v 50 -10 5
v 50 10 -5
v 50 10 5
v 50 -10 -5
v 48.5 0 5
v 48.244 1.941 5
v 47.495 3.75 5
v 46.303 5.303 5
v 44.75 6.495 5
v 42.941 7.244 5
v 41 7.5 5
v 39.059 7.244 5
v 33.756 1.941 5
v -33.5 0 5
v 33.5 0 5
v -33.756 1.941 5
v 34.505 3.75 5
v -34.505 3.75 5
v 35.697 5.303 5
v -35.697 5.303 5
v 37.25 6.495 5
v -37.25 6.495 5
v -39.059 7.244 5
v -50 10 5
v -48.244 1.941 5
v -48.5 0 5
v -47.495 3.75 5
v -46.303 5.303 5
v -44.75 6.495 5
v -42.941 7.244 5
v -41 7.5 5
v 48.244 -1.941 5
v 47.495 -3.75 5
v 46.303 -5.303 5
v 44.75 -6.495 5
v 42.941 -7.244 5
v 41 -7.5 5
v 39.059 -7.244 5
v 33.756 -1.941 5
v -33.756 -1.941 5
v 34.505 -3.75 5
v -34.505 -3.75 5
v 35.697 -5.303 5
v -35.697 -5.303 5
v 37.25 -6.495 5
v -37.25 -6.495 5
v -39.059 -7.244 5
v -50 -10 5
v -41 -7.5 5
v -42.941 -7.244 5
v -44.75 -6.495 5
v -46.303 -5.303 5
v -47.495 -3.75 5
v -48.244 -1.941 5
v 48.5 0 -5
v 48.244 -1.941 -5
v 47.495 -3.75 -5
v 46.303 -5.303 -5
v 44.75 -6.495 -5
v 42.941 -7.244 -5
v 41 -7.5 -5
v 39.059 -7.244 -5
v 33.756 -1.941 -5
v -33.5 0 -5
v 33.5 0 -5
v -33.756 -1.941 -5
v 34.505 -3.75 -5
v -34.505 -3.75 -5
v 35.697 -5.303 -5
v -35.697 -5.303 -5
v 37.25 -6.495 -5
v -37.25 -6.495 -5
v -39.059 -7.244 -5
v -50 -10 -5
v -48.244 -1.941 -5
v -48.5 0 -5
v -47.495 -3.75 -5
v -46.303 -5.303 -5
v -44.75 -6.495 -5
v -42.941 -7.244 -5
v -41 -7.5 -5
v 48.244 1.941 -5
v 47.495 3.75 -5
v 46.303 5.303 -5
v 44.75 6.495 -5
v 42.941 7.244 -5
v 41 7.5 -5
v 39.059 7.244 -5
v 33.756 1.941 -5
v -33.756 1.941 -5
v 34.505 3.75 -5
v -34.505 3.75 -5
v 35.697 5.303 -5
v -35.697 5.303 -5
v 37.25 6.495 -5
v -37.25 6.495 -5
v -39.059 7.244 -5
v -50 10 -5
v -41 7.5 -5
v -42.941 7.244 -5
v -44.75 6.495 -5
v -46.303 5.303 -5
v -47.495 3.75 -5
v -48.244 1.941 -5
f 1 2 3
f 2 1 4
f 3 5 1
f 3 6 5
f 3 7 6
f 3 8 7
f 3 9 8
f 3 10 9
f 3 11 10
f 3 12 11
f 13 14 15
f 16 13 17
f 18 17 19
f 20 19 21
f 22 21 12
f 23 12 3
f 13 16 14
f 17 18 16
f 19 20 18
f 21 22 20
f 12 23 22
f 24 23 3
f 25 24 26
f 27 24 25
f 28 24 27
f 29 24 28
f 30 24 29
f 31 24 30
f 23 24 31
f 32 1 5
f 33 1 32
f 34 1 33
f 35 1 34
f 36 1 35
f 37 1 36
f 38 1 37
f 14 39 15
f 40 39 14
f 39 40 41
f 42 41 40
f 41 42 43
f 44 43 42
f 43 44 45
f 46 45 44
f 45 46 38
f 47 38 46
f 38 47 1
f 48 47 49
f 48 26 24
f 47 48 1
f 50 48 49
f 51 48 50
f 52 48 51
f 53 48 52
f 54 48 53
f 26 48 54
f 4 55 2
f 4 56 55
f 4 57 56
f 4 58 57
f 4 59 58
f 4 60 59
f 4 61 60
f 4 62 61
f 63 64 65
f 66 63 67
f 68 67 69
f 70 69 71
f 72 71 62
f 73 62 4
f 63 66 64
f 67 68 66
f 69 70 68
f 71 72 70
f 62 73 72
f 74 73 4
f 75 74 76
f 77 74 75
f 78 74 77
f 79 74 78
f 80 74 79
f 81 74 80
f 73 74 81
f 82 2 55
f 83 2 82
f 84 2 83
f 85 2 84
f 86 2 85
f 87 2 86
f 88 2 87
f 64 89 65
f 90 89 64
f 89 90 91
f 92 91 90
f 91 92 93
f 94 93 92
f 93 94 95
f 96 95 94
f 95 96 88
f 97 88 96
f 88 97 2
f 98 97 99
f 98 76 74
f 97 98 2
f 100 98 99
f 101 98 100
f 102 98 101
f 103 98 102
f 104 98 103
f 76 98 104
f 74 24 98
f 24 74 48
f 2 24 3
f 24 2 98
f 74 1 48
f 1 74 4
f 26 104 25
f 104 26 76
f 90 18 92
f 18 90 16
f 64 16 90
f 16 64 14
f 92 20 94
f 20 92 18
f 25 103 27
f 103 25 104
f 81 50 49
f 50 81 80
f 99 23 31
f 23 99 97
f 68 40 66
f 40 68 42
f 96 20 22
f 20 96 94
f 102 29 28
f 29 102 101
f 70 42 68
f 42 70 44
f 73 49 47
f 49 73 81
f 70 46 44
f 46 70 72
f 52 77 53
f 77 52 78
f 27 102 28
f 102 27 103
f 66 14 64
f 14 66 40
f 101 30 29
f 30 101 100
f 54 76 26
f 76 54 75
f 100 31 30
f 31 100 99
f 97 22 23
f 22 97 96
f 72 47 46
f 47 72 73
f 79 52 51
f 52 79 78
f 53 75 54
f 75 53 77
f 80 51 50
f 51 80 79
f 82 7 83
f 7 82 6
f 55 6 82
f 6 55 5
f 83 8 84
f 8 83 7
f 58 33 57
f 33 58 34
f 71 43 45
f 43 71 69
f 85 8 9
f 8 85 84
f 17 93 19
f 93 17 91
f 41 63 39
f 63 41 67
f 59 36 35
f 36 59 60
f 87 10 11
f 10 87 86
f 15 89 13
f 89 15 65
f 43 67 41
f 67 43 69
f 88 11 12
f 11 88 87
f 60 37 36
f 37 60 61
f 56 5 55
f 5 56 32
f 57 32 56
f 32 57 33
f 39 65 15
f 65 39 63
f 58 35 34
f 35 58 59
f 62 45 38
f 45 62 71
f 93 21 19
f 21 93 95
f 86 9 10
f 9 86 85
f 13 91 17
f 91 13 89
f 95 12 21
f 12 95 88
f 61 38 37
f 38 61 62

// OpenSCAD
// Plantilla paramétrica para diseñar un eslabón rectangular con huecos circulares en las puntas

// Parámetros
length = 100;       // Largo del eslabón
width = 20;         // Ancho del eslabón
thickness = 10;     // Grosor del eslabón
hole_diameter = 15; // Diámetro de los huecos circulares
edge_tolerance = 1.5; // Tolerancia para el ajuste de los agujeros

module link(length, width, thickness, hole_diameter) {
    // Cuerpo principal del eslabón
    difference() {
        cube([length, width, thickness], center = true);
        
        hole_dist = length / 2 - hole_diameter / 2 - edge_tolerance;

        // Hueco circular en el extremo izquierdo
        translate([-hole_dist, 0, 0])
            cylinder(r = hole_diameter / 2, h = thickness + 1, center = true);
        
        // Hueco circular en el extremo derecho
        translate([hole_dist, 0, 0])
            cylinder(r = hole_diameter / 2, h = thickness + 1, center = true);
    }
}

// Llamada al módulo para generar el eslabón
link(length, width, thickness, hole_diameter);
